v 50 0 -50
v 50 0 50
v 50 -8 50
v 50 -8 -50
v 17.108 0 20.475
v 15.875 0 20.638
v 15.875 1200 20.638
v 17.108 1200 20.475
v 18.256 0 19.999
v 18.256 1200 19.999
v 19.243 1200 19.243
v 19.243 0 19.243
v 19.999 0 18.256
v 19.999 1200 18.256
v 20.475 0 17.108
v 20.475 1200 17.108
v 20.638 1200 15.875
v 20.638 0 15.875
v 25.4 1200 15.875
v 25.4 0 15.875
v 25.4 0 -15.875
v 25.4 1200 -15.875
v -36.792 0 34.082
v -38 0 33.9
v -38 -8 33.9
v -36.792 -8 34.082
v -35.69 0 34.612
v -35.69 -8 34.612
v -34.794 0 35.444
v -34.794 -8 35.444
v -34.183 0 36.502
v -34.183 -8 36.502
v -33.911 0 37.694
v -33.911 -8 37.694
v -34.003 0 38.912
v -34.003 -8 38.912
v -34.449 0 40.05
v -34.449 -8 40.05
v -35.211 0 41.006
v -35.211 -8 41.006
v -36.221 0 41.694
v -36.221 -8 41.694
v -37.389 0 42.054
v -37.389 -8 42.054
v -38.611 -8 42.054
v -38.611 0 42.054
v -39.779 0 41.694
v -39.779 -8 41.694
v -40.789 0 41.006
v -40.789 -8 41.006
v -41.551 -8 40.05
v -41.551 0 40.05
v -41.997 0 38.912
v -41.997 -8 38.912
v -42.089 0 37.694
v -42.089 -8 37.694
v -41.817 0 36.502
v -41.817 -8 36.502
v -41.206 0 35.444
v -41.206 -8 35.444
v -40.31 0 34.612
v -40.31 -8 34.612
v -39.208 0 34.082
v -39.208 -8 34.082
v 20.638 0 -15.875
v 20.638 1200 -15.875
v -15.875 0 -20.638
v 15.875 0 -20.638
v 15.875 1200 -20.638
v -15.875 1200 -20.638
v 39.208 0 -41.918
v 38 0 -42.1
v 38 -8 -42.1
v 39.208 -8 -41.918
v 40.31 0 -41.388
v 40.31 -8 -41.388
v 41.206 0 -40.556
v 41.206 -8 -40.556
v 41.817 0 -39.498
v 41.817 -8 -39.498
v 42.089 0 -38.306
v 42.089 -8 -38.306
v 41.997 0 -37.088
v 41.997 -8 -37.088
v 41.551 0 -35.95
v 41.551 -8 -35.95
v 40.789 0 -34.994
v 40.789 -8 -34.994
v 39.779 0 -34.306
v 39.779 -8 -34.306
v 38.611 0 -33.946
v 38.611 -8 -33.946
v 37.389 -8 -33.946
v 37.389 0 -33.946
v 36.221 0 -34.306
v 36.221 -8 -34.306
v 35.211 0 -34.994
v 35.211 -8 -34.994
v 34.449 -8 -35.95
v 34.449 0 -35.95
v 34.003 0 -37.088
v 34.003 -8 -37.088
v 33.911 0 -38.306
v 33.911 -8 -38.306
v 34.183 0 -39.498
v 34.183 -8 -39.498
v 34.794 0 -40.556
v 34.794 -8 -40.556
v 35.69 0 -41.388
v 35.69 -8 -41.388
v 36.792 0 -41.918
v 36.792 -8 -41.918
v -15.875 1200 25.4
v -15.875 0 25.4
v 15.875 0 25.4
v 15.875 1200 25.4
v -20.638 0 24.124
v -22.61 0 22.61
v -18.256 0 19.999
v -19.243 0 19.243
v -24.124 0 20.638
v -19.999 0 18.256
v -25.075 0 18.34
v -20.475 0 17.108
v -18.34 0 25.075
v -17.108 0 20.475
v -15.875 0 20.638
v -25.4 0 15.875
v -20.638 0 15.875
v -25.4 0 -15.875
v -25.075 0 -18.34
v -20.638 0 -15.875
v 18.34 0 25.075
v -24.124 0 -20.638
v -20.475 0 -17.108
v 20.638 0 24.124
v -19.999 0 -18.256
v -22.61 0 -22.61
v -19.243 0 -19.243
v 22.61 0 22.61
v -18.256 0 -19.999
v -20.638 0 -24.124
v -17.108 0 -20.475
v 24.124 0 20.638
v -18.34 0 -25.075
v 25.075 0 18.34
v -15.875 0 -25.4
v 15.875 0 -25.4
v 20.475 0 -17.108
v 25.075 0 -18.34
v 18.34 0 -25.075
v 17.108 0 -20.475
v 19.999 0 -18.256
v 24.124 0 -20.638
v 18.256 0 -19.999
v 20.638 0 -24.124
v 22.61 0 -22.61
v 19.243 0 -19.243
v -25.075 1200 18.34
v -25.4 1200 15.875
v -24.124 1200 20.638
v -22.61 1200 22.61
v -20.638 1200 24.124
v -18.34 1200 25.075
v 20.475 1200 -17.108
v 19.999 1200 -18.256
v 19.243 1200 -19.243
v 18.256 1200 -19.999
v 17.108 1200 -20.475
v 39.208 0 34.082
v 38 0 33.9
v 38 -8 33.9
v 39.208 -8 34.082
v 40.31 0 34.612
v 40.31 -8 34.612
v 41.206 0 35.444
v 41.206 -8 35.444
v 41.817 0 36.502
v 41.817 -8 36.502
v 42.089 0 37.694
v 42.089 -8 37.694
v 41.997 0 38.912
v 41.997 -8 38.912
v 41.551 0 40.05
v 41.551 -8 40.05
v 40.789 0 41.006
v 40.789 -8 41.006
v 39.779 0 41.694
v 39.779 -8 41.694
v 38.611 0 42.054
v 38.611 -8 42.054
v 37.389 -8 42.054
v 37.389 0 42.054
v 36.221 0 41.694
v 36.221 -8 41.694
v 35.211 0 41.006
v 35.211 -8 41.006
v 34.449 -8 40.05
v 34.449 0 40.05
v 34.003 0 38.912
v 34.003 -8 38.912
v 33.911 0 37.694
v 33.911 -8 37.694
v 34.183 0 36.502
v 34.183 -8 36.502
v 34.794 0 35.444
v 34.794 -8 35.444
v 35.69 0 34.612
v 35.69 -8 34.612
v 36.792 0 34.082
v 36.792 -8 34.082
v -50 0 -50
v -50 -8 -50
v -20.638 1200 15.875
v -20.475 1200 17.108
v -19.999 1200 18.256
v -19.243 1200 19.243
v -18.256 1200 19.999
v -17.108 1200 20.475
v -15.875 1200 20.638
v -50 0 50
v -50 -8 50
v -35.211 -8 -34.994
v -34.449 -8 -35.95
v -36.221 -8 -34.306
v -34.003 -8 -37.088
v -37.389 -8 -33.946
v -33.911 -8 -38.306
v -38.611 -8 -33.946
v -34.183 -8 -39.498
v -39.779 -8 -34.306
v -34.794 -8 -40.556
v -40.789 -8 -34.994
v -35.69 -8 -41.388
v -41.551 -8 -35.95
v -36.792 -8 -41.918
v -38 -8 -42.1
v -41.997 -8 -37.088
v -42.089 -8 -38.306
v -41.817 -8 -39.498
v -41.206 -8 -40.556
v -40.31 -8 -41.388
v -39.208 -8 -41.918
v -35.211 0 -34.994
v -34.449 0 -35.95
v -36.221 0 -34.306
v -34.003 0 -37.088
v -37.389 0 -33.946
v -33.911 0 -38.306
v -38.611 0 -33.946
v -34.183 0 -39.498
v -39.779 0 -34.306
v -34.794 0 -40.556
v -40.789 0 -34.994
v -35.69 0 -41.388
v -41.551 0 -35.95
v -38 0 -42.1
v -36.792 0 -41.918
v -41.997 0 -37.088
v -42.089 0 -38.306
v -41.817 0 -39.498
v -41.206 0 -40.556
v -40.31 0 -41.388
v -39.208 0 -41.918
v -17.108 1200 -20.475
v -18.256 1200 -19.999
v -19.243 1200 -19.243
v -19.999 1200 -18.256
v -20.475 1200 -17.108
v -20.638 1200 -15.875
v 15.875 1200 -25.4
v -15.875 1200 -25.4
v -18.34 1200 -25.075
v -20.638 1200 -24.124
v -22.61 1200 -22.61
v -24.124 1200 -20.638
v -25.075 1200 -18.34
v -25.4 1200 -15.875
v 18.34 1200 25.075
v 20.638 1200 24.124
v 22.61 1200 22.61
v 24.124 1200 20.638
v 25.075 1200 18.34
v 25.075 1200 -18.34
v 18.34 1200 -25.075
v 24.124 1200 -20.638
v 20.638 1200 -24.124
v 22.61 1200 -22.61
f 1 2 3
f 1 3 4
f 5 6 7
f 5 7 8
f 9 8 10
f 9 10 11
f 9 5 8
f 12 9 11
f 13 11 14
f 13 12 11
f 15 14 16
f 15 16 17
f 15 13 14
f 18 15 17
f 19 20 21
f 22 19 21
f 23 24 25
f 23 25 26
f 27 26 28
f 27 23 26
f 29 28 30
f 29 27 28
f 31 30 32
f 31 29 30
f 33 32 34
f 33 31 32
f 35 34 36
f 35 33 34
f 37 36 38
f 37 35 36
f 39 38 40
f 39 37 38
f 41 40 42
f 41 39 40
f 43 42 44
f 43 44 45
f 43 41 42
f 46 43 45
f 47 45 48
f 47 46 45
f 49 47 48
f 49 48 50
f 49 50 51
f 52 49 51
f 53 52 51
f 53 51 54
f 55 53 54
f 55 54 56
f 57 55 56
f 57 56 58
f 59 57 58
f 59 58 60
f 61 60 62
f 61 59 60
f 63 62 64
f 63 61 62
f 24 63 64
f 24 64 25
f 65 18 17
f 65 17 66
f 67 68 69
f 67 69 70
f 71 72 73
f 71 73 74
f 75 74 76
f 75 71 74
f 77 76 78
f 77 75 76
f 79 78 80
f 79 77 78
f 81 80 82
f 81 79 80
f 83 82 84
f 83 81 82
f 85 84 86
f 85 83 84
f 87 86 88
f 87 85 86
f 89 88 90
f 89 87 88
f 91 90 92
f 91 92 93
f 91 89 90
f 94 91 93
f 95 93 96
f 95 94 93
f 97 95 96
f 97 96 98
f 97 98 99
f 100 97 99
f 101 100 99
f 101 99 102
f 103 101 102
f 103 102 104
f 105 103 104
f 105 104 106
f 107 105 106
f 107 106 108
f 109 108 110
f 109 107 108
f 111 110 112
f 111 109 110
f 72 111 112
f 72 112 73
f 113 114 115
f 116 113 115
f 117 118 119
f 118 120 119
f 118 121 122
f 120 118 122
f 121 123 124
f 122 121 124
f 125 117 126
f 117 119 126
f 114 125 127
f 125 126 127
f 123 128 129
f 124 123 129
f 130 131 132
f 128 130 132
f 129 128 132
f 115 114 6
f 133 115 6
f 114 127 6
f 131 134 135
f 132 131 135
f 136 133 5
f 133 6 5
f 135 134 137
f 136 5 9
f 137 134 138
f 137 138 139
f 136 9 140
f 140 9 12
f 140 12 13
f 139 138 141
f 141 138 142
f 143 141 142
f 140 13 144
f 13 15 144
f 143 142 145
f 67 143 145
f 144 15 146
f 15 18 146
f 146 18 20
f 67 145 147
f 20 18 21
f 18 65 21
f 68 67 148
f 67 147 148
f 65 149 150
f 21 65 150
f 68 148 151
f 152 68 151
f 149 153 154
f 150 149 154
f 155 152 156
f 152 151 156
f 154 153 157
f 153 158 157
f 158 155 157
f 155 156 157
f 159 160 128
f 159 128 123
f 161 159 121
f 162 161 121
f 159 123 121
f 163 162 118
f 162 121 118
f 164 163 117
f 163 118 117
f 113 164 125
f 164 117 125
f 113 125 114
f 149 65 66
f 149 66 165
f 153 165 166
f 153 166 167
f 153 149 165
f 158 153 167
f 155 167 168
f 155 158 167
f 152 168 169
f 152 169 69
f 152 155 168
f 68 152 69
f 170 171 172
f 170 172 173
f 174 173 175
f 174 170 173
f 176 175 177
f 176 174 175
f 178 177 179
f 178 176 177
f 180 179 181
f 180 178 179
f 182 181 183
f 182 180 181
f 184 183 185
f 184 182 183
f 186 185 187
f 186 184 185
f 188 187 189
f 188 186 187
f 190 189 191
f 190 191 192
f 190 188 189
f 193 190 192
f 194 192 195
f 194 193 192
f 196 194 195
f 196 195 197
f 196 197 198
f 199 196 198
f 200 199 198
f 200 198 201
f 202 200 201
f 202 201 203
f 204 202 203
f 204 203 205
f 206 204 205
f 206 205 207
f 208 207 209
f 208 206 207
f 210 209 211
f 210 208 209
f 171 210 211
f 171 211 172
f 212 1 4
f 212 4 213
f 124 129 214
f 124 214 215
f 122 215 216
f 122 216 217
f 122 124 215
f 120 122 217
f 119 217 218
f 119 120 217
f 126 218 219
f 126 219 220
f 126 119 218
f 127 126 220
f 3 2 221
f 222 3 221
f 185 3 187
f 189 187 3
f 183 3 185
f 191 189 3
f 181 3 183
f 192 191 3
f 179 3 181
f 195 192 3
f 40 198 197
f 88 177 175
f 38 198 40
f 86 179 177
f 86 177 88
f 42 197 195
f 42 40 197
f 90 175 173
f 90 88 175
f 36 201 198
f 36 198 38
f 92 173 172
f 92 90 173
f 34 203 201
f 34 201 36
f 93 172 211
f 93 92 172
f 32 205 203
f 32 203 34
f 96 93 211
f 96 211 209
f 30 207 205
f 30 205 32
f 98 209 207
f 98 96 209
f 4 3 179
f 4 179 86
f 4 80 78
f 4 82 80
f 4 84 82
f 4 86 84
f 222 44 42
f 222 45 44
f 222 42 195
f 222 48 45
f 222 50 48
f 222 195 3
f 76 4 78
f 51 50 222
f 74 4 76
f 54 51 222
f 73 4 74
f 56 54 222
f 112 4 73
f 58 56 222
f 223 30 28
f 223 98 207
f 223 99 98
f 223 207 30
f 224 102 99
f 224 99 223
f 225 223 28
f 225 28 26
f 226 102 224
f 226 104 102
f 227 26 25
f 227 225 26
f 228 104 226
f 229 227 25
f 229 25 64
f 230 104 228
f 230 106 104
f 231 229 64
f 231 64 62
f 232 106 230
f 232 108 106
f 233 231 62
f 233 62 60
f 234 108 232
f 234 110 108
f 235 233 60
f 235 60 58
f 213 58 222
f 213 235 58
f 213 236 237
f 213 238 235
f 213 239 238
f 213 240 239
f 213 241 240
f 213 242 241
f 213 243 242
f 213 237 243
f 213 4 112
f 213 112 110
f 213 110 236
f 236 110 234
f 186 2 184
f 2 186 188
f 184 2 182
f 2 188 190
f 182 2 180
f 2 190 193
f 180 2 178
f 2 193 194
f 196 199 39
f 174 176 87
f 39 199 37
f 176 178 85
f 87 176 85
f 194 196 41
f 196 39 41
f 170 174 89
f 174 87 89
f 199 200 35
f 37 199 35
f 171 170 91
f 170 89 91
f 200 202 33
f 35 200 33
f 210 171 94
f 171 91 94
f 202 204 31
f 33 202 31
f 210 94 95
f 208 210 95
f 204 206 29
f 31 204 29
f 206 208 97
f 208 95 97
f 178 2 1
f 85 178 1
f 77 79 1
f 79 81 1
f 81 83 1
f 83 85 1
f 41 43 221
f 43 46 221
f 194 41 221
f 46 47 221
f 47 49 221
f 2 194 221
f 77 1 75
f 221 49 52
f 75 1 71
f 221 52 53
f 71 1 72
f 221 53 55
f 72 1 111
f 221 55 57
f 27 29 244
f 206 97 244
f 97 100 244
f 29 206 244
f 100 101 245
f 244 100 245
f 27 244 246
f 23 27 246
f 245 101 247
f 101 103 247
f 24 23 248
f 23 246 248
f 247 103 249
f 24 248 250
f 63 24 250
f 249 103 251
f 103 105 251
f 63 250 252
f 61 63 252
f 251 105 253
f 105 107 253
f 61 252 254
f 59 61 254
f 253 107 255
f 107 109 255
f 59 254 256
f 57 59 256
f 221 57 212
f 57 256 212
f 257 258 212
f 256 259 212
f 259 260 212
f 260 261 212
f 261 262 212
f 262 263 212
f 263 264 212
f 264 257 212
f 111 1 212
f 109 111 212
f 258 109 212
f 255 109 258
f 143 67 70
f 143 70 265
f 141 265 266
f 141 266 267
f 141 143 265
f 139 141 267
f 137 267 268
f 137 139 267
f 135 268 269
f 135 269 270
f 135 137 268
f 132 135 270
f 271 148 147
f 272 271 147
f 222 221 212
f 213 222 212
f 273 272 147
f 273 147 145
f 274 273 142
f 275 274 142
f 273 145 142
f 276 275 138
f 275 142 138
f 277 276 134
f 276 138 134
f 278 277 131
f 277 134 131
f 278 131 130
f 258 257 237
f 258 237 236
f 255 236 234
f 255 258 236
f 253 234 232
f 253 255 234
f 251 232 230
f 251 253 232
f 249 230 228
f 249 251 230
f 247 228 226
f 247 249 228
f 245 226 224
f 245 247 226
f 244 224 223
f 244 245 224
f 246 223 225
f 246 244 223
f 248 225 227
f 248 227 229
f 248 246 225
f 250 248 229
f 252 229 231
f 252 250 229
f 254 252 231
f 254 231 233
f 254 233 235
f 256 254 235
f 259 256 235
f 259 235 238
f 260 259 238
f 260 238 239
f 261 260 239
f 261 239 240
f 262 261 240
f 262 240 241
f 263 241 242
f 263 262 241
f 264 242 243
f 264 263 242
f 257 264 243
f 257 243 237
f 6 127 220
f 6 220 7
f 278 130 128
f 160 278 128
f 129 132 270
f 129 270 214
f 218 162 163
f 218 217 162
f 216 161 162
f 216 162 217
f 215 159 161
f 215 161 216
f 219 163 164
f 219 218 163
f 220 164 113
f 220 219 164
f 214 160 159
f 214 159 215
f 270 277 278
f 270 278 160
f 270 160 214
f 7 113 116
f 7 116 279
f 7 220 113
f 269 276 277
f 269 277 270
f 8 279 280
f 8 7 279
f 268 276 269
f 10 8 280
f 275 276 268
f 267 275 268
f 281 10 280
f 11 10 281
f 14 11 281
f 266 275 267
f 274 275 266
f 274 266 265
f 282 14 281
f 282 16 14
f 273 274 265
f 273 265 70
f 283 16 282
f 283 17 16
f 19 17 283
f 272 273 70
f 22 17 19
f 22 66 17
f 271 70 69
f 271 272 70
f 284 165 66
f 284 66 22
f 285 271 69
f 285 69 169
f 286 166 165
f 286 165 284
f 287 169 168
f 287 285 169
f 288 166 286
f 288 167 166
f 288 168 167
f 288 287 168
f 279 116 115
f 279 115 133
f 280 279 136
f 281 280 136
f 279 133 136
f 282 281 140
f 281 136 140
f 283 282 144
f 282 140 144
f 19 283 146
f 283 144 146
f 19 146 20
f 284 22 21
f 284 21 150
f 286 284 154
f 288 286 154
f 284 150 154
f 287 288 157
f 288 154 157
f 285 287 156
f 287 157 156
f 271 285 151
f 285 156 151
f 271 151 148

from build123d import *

# Parameters (mm, degrees)
RURA_CIENKO_CIENNA_KWADRATOWA_TS2X2X0_18_DEPTH = 1200
SZKIC4_W                                       = 100
SZKIC4_H                                       = 100
SZKIC4_R                                       = 4.1
DODANIE_WYCI_GNI_CIE1_DEPTH                    = 8


with BuildPart() as part:
    # Sketch12 → Rura cienkościenna kwadratowa TS2X2X0.1875(1) (new body)
    with BuildSketch(Plane(origin=(0, 0, 0), x_dir=(1, 0, 0), z_dir=(0, 1, 0))):
        with BuildLine():
            Line((-15.875, -25.4), (15.875, -25.4))
            ThreePointArc((15.875, -25.4), (22.610192091, -22.610192091), (25.4, -15.875))
            Line((25.4, -15.875), (25.4, 15.875))
            ThreePointArc((25.4, 15.875), (22.610192091, 22.610192091), (15.875, 25.4))
            Line((15.875, 25.4), (-15.875, 25.4))
            ThreePointArc((-15.875, 25.4), (-22.610192091, 22.610192091), (-25.4, 15.875))
            Line((-25.4, 15.875), (-25.4, -15.875))
            ThreePointArc((-25.4, -15.875), (-22.610192091, -22.610192091), (-15.875, -25.4))
        make_face()
        with BuildLine():
            Line((-15.875, -20.6375), (15.875, -20.6375))
            ThreePointArc((15.875, -20.6375), (19.242596045, -19.242596045), (20.6375, -15.875))
            Line((20.6375, -15.875), (20.6375, 15.875))
            ThreePointArc((20.6375, 15.875), (19.242596045, 19.242596045), (15.875, 20.6375))
            Line((15.875, 20.6375), (-15.875, 20.6375))
            ThreePointArc((-15.875, 20.6375), (-19.242596045, 19.242596045), (-20.6375, 15.875))
            Line((-20.6375, 15.875), (-20.6375, -15.875))
            ThreePointArc((-20.6375, -15.875), (-19.242596045, -19.242596045), (-15.875, -20.6375))
        make_face(mode=Mode.SUBTRACT)
    extrude(amount=RURA_CIENKO_CIENNA_KWADRATOWA_TS2X2X0_18_DEPTH)


with BuildPart() as body_2:
    # Szkic4 → Dodanie-wyciągnięcie1 (new body)
    with BuildSketch(Plane(origin=(0, 0, 0), x_dir=(-1, 0, 0), z_dir=(0, -1, 0))):
        Rectangle(SZKIC4_W, SZKIC4_H)
        with Locations(Location((38, -38, 0), (0, 0, 90))):
            Circle(SZKIC4_R, mode=Mode.SUBTRACT)
        with Locations(Location((-38, -38, 0), (0, 0, 90))):
            Circle(SZKIC4_R, mode=Mode.SUBTRACT)
        with Locations(Location((-38, 38, 0), (0, 0, 90))):
            Circle(SZKIC4_R, mode=Mode.SUBTRACT)
        with Locations(Location((38, 38, 0), (0, 0, 90))):
            Circle(SZKIC4_R, mode=Mode.SUBTRACT)
    extrude(amount=DODANIE_WYCI_GNI_CIE1_DEPTH)


solid = Compound([part.part, body_2.part])
